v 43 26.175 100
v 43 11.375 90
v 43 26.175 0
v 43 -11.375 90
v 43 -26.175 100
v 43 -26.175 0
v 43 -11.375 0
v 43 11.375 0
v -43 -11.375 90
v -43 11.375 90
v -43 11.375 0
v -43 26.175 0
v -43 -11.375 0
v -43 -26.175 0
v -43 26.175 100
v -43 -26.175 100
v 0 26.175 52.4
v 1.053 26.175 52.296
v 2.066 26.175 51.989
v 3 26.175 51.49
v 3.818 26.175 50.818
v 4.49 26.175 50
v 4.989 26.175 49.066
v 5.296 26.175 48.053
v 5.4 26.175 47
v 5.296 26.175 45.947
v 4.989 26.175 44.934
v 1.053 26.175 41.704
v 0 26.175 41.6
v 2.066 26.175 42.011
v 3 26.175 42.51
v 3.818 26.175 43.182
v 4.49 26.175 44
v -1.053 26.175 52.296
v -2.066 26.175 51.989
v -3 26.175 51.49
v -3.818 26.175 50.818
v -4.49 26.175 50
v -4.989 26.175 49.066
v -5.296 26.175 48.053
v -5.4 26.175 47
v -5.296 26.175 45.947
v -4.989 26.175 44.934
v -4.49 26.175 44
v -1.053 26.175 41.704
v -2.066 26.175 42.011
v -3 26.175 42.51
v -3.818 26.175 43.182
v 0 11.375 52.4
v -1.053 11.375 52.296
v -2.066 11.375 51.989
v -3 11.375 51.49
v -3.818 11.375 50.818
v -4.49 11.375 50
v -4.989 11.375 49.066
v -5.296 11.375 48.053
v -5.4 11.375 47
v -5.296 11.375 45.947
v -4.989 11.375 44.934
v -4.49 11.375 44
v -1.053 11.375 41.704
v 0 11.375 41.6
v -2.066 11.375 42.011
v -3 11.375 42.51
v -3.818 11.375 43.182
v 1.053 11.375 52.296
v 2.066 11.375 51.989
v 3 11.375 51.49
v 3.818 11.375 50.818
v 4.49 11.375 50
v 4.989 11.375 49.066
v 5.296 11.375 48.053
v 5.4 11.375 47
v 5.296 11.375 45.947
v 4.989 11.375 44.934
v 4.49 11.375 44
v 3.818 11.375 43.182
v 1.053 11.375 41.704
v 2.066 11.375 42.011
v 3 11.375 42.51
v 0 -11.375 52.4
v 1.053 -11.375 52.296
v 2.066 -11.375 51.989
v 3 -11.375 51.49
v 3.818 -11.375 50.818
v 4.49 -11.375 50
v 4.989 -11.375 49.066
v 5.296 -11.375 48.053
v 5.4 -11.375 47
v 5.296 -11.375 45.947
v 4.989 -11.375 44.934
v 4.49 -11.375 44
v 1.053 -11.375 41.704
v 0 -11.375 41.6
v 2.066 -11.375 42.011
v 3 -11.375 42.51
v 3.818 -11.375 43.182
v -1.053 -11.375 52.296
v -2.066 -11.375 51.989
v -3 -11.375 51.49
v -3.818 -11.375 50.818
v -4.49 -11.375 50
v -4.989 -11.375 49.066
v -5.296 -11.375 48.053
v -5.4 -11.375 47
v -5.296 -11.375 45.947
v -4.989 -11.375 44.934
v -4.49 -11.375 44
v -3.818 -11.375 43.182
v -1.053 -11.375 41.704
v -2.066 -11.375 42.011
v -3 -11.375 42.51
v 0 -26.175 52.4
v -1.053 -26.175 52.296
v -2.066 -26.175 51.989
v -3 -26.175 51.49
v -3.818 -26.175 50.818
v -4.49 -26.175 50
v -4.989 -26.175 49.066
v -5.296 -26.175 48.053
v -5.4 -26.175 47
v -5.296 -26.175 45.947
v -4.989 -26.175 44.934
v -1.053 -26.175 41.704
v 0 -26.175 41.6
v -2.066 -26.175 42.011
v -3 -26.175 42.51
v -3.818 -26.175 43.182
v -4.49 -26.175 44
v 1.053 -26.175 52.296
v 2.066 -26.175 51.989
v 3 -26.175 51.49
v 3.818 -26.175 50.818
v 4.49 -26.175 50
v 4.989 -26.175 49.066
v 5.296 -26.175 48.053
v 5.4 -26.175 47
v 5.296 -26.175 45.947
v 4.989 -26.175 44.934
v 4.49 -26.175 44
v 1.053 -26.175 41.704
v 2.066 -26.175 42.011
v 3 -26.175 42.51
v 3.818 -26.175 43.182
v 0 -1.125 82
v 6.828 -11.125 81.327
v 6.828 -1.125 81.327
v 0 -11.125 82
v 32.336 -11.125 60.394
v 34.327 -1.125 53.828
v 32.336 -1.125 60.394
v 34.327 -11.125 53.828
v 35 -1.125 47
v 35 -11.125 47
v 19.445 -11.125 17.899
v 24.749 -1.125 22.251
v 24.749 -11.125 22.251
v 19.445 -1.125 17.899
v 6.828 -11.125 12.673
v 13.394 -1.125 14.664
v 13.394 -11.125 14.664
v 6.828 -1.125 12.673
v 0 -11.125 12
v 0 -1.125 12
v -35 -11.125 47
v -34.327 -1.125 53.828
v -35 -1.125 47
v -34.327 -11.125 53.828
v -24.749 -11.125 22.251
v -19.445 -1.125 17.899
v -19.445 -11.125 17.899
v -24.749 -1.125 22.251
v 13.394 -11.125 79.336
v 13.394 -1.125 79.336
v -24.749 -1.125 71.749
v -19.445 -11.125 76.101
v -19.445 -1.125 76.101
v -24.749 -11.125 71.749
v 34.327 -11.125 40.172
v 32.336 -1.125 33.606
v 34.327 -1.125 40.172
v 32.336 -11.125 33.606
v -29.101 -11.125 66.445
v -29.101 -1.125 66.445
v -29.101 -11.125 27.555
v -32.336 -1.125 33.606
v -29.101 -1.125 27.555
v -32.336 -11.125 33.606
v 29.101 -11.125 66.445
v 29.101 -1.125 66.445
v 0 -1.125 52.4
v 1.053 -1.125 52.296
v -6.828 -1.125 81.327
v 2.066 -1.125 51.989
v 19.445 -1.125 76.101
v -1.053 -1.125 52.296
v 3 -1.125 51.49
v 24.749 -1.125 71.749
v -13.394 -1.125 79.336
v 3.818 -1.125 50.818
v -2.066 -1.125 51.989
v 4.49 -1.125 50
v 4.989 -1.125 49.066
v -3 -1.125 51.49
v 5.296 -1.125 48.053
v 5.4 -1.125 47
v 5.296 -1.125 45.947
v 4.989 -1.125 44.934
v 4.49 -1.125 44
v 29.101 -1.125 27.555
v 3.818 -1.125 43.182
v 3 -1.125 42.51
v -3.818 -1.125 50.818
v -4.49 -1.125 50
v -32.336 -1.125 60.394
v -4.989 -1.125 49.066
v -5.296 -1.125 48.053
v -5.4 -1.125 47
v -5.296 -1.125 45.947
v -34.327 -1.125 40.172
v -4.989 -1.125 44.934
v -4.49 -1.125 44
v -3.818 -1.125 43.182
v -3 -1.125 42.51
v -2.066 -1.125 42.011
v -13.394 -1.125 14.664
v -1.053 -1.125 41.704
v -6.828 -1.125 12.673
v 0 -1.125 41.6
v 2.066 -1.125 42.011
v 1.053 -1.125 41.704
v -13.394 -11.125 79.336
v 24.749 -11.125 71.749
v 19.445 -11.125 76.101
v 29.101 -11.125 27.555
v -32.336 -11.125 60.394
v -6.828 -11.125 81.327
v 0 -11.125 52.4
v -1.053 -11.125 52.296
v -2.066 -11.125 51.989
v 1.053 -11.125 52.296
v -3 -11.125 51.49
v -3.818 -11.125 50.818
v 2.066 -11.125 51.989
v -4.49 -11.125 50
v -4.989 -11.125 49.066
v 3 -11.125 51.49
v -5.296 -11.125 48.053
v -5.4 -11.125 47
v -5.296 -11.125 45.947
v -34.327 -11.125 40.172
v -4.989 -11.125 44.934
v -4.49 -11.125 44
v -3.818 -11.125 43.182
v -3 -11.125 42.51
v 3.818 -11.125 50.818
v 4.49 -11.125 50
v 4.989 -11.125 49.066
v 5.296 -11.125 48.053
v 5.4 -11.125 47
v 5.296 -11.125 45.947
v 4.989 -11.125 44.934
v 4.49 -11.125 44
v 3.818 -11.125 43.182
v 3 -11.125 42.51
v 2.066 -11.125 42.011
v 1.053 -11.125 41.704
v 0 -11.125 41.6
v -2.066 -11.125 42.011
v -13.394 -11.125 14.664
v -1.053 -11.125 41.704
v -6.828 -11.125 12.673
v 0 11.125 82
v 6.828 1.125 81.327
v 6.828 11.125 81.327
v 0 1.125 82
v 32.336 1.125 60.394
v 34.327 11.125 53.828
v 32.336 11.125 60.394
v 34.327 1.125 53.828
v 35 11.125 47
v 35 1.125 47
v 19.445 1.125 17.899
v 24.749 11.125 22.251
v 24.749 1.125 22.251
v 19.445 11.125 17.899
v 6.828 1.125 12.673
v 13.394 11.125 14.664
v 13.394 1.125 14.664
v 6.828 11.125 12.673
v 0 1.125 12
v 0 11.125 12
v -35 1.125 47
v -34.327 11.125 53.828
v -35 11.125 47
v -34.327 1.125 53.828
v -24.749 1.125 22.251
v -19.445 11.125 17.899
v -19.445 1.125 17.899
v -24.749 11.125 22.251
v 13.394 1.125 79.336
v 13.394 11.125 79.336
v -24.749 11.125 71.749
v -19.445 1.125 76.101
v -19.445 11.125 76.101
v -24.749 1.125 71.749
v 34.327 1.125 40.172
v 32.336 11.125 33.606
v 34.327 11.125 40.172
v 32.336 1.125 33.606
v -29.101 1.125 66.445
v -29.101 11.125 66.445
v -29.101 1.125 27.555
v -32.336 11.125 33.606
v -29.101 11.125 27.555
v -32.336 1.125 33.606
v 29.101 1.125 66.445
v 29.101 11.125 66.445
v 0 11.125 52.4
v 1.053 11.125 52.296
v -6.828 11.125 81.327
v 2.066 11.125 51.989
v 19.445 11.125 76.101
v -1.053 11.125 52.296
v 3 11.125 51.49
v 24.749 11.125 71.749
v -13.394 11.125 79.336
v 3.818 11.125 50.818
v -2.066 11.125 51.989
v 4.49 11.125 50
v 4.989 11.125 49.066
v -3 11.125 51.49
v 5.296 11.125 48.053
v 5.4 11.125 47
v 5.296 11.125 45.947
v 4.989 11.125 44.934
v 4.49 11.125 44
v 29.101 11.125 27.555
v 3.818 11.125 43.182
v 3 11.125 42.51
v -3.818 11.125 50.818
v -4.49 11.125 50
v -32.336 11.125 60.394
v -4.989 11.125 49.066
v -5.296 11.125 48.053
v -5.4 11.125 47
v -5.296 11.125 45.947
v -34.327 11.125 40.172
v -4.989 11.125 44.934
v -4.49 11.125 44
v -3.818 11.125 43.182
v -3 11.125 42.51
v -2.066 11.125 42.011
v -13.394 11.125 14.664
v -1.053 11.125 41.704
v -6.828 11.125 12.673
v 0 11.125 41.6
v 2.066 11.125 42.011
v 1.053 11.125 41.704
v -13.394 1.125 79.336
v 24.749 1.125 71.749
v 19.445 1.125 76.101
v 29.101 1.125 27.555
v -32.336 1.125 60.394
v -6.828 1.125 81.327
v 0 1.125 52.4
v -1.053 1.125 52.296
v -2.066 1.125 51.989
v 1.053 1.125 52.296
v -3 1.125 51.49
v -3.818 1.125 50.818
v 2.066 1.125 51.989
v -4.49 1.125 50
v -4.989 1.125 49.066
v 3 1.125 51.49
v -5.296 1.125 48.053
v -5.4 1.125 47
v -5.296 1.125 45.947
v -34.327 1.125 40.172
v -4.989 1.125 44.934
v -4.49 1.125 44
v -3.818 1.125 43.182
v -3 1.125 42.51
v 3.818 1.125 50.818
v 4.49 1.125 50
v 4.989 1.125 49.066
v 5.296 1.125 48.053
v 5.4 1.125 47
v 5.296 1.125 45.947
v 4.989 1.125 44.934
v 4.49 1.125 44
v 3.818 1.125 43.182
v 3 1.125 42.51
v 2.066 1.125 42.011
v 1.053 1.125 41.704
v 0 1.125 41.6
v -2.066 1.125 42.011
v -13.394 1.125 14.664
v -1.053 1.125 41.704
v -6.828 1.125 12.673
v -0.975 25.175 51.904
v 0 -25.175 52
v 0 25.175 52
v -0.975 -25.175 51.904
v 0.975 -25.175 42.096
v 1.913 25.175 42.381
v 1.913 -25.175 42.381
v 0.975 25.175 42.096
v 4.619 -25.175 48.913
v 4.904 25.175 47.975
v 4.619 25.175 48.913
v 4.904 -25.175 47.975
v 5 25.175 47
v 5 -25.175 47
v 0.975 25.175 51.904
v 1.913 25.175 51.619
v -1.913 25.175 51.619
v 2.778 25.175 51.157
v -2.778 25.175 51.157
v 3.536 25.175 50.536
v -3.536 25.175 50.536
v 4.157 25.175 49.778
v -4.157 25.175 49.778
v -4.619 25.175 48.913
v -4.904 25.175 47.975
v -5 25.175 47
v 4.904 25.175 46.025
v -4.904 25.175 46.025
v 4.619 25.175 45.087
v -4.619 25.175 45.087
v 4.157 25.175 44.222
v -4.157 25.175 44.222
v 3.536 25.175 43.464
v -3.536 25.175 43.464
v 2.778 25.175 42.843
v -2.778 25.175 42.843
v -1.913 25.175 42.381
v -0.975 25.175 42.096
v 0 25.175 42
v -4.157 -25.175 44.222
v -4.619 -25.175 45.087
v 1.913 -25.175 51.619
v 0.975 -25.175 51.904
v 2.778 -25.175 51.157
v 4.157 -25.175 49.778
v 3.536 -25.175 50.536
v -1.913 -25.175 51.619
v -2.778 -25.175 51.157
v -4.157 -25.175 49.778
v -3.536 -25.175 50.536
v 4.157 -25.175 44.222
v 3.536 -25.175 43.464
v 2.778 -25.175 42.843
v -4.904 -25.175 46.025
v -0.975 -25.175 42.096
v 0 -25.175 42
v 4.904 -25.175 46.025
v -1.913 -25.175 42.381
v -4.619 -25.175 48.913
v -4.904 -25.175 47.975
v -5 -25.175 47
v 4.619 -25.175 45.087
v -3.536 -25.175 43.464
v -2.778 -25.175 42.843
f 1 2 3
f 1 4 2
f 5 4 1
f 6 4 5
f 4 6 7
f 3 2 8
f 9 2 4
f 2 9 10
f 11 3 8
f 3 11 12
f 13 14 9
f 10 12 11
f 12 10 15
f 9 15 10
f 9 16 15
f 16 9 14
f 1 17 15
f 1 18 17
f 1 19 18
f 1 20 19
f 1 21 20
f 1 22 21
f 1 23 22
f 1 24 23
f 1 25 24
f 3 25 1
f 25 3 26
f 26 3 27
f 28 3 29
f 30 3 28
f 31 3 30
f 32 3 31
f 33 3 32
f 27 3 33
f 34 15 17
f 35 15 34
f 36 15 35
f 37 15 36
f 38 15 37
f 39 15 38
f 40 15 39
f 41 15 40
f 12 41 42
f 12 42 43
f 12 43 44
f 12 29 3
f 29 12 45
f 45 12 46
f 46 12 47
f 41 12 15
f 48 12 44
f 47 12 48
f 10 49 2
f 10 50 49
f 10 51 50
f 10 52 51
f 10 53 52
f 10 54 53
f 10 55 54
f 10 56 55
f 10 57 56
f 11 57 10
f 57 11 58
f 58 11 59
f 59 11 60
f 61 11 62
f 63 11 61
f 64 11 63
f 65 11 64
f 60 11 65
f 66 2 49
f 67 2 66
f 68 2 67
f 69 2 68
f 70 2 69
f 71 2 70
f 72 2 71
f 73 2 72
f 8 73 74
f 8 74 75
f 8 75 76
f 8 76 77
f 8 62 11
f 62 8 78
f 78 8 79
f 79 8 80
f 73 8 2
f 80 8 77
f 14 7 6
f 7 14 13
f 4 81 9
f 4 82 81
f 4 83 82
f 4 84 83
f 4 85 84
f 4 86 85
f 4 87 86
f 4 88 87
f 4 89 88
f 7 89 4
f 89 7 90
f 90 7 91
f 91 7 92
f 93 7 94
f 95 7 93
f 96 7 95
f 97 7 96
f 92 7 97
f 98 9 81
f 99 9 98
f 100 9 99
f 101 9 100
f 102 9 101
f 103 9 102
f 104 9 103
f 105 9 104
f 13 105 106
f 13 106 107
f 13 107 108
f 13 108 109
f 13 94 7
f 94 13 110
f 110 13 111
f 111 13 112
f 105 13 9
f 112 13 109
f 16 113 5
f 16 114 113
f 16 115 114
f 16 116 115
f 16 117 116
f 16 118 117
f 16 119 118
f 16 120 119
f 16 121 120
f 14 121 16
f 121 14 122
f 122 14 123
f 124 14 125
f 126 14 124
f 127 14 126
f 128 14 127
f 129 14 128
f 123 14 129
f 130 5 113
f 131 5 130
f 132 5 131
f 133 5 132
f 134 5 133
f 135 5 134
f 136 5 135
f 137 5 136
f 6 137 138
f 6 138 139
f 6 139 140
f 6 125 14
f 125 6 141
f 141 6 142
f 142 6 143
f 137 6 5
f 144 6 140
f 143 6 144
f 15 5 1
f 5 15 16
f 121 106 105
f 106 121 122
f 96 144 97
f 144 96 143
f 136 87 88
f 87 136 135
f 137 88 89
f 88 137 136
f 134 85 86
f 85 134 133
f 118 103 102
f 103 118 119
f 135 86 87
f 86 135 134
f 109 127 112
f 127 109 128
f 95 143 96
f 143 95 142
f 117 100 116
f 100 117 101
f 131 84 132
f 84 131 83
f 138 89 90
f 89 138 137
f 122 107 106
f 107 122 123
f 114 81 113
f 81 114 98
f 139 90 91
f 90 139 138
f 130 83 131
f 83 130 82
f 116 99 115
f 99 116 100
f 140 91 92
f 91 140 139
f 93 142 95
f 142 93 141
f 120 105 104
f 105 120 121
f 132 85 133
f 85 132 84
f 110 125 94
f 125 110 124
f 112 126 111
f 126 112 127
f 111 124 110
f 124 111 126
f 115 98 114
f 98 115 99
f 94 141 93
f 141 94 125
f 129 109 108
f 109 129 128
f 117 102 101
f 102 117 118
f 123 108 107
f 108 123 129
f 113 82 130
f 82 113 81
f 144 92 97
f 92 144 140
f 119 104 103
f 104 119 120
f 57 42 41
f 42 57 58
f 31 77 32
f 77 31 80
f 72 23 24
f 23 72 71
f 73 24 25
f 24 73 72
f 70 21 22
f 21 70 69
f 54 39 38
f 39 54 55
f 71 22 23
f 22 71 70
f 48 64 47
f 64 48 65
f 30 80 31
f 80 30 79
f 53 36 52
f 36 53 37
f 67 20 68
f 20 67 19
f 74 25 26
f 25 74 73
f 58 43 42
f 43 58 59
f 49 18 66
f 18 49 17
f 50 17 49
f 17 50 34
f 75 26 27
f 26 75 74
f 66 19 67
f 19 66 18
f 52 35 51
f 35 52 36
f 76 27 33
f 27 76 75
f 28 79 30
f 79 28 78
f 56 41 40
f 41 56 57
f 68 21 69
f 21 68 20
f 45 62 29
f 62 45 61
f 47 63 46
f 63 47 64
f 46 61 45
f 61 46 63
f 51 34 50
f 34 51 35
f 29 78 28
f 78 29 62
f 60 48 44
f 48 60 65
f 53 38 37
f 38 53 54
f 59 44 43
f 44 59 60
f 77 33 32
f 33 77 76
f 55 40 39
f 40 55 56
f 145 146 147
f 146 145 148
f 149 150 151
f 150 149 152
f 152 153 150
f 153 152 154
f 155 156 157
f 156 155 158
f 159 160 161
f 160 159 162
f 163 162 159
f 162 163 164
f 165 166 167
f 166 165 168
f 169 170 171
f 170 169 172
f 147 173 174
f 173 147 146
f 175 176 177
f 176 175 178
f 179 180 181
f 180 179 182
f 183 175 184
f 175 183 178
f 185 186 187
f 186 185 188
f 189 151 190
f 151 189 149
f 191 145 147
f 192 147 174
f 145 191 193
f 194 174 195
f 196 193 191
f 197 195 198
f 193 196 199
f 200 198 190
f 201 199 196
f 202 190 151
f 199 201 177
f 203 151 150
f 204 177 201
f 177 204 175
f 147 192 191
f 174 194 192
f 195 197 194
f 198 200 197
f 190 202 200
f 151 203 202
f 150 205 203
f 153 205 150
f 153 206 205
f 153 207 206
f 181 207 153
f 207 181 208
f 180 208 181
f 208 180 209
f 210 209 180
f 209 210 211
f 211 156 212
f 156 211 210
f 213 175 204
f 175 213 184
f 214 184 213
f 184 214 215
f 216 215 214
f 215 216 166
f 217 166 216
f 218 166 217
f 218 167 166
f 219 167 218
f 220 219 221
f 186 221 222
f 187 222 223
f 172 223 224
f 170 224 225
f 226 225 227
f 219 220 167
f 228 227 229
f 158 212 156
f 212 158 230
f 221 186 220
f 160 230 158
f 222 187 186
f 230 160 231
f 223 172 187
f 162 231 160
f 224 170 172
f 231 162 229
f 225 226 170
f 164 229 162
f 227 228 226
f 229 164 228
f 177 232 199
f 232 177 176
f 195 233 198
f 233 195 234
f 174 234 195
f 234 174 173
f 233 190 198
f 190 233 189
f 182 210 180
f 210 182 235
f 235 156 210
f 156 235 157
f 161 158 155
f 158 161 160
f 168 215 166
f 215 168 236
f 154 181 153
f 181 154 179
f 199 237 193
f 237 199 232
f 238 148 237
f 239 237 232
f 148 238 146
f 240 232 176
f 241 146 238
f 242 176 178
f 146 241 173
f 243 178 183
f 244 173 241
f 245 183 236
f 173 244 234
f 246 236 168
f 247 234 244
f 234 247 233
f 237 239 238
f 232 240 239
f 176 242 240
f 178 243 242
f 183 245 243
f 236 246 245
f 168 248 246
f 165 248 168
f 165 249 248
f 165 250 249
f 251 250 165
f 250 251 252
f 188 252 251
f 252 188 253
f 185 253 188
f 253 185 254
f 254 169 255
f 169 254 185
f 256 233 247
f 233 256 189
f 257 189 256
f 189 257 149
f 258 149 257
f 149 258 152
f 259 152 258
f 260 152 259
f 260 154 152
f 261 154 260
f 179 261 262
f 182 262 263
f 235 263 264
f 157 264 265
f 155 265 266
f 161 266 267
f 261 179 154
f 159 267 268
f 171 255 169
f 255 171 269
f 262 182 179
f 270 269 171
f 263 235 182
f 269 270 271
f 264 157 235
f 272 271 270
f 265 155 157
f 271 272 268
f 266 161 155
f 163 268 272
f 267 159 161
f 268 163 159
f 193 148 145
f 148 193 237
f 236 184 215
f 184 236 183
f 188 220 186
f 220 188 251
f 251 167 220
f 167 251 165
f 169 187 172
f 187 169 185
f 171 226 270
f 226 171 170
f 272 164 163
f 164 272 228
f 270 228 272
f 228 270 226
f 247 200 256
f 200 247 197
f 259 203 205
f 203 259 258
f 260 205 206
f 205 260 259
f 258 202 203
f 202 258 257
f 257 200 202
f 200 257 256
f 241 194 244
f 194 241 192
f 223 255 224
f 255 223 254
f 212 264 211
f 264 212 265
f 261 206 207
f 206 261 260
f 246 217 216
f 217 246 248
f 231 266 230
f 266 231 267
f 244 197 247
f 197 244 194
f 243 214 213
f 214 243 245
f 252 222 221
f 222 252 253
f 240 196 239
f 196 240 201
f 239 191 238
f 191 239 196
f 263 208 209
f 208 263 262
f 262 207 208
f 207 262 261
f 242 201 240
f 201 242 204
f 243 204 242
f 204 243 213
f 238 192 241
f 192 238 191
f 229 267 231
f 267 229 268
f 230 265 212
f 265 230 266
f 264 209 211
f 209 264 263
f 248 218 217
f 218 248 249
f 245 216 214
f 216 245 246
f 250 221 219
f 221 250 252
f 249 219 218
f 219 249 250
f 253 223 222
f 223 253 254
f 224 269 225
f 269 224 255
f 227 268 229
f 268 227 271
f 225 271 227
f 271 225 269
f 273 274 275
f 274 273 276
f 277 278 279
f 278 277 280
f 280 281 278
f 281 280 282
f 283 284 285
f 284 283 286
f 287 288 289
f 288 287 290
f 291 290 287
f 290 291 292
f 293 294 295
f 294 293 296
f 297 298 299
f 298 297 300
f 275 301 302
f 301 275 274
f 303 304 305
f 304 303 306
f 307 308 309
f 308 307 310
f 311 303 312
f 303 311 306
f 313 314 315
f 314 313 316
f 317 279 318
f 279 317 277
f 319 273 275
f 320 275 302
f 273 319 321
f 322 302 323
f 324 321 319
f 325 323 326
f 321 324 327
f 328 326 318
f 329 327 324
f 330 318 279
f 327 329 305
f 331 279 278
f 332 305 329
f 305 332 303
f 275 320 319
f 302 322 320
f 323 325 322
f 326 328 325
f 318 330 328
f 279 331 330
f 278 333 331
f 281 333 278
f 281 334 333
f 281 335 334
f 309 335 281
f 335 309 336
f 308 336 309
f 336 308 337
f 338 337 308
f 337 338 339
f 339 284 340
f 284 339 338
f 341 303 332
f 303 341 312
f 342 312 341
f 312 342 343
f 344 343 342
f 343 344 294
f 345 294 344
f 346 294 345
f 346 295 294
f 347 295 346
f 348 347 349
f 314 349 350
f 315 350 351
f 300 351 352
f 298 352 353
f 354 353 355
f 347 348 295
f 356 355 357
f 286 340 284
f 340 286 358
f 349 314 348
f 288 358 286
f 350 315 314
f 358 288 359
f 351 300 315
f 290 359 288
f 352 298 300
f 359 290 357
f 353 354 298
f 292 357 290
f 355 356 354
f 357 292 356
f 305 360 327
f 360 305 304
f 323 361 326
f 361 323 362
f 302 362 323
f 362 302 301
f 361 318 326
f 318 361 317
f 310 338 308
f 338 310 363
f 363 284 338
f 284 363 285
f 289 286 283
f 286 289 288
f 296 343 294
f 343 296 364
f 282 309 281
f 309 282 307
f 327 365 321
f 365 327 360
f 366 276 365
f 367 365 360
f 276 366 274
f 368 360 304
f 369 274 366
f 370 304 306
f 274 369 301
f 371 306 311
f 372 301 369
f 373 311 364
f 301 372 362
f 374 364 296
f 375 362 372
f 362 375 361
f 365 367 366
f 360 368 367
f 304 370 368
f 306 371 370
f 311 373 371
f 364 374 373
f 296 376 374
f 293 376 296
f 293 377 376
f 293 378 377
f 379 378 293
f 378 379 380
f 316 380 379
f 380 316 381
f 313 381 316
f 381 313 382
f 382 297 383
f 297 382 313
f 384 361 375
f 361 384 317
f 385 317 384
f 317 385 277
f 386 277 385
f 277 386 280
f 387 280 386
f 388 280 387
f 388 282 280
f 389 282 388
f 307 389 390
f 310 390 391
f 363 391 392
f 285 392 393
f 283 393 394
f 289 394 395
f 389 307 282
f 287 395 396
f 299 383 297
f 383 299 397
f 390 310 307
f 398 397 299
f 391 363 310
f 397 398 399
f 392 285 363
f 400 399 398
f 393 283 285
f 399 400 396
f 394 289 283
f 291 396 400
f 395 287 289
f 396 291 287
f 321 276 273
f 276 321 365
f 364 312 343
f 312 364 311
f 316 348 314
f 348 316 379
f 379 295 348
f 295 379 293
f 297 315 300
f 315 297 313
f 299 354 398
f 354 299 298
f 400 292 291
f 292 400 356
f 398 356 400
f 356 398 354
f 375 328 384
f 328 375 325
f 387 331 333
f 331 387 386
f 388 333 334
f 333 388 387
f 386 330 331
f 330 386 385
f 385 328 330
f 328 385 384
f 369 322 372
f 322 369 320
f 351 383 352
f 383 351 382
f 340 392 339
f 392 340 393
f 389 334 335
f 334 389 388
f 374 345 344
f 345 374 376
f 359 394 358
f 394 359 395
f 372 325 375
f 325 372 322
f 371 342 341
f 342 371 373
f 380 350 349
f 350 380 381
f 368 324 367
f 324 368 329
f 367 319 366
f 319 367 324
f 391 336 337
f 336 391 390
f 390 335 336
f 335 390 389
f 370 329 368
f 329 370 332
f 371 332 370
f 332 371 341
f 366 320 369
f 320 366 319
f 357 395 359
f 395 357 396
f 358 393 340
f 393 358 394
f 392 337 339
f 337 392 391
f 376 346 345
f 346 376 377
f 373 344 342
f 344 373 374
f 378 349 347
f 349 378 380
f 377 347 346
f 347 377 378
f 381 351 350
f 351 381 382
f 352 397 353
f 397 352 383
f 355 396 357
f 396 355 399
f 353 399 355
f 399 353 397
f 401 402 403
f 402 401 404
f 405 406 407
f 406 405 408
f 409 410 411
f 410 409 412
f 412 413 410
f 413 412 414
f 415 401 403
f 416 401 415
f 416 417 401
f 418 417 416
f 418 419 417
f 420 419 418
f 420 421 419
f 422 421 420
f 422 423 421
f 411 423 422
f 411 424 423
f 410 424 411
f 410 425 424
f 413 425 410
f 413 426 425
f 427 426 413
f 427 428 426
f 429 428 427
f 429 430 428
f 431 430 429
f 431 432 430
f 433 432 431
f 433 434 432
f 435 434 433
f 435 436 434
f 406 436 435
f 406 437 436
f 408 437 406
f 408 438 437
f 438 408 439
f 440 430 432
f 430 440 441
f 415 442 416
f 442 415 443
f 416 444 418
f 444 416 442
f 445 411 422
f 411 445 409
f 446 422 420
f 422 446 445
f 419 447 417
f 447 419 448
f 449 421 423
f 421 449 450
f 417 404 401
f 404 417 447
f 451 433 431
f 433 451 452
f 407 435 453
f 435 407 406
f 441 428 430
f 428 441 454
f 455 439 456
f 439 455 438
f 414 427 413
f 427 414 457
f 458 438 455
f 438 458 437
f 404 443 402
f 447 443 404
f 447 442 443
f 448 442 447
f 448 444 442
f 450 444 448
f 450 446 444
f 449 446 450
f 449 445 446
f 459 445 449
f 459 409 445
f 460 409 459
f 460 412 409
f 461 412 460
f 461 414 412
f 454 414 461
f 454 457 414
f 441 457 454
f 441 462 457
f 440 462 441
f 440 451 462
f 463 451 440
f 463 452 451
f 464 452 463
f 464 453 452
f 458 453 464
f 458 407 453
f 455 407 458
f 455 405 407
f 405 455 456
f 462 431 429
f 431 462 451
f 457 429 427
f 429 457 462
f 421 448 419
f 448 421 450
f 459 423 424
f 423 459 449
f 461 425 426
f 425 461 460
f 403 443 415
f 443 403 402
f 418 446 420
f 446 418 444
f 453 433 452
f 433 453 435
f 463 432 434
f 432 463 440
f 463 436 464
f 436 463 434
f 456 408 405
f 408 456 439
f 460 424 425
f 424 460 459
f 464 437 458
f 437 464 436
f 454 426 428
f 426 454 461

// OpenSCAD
$fn = 32;

// ------------------------------------------------------------------------
// Trolley wheel set: wheels d70, fork 90 mm tall
// Every part is its own module, assembly() places every instance.
// ------------------------------------------------------------------------

// --- part 1 ---
module trolley_fork() {
  difference() {
    union() {
      translate([-43, 11.375, 0]) cube([86, 14.8, 90]);
      translate([-43, -26.175, 0]) cube([86, 14.8, 90]);
      translate([-43, -26.175, 90]) cube([86, 52.35, 10]);
    }
    translate([0, -18.775, 47]) rotate([90, 0, 0]) cylinder(h = 16.8, d = 10.8, center = true);
    translate([0, 18.775, 47]) rotate([90, 0, 0]) cylinder(h = 16.8, d = 10.8, center = true);
  }
}

// --- part 2 ---
module trolley_wheel() {
  difference() {
      translate([0, 0, 0]) cylinder(h = 10, d = 70);
      translate([0, 0, -1]) cylinder(h = 12, d = 10.8);
    }
}

// --- part 3 ---
module trolley_axle() {
  translate([0, 0, -25.175]) cylinder(h = 50.35, d = 10);
}

// --- assembly ---
module assembly() {
  color([0.80, 0.24, 0.20]) translate([0, 0, 0]) rotate([0, 0, 0]) trolley_fork();
  color([0.20, 0.45, 0.75]) translate([0, -1.125, 47]) rotate([90, 0, 0]) trolley_wheel();
  color([0.25, 0.62, 0.32]) translate([0, 11.125, 47]) rotate([90, 0, 0]) trolley_wheel();
  color([0.92, 0.70, 0.18]) translate([0, 0, 47]) rotate([90, 0, 0]) trolley_axle();
}

assembly();
